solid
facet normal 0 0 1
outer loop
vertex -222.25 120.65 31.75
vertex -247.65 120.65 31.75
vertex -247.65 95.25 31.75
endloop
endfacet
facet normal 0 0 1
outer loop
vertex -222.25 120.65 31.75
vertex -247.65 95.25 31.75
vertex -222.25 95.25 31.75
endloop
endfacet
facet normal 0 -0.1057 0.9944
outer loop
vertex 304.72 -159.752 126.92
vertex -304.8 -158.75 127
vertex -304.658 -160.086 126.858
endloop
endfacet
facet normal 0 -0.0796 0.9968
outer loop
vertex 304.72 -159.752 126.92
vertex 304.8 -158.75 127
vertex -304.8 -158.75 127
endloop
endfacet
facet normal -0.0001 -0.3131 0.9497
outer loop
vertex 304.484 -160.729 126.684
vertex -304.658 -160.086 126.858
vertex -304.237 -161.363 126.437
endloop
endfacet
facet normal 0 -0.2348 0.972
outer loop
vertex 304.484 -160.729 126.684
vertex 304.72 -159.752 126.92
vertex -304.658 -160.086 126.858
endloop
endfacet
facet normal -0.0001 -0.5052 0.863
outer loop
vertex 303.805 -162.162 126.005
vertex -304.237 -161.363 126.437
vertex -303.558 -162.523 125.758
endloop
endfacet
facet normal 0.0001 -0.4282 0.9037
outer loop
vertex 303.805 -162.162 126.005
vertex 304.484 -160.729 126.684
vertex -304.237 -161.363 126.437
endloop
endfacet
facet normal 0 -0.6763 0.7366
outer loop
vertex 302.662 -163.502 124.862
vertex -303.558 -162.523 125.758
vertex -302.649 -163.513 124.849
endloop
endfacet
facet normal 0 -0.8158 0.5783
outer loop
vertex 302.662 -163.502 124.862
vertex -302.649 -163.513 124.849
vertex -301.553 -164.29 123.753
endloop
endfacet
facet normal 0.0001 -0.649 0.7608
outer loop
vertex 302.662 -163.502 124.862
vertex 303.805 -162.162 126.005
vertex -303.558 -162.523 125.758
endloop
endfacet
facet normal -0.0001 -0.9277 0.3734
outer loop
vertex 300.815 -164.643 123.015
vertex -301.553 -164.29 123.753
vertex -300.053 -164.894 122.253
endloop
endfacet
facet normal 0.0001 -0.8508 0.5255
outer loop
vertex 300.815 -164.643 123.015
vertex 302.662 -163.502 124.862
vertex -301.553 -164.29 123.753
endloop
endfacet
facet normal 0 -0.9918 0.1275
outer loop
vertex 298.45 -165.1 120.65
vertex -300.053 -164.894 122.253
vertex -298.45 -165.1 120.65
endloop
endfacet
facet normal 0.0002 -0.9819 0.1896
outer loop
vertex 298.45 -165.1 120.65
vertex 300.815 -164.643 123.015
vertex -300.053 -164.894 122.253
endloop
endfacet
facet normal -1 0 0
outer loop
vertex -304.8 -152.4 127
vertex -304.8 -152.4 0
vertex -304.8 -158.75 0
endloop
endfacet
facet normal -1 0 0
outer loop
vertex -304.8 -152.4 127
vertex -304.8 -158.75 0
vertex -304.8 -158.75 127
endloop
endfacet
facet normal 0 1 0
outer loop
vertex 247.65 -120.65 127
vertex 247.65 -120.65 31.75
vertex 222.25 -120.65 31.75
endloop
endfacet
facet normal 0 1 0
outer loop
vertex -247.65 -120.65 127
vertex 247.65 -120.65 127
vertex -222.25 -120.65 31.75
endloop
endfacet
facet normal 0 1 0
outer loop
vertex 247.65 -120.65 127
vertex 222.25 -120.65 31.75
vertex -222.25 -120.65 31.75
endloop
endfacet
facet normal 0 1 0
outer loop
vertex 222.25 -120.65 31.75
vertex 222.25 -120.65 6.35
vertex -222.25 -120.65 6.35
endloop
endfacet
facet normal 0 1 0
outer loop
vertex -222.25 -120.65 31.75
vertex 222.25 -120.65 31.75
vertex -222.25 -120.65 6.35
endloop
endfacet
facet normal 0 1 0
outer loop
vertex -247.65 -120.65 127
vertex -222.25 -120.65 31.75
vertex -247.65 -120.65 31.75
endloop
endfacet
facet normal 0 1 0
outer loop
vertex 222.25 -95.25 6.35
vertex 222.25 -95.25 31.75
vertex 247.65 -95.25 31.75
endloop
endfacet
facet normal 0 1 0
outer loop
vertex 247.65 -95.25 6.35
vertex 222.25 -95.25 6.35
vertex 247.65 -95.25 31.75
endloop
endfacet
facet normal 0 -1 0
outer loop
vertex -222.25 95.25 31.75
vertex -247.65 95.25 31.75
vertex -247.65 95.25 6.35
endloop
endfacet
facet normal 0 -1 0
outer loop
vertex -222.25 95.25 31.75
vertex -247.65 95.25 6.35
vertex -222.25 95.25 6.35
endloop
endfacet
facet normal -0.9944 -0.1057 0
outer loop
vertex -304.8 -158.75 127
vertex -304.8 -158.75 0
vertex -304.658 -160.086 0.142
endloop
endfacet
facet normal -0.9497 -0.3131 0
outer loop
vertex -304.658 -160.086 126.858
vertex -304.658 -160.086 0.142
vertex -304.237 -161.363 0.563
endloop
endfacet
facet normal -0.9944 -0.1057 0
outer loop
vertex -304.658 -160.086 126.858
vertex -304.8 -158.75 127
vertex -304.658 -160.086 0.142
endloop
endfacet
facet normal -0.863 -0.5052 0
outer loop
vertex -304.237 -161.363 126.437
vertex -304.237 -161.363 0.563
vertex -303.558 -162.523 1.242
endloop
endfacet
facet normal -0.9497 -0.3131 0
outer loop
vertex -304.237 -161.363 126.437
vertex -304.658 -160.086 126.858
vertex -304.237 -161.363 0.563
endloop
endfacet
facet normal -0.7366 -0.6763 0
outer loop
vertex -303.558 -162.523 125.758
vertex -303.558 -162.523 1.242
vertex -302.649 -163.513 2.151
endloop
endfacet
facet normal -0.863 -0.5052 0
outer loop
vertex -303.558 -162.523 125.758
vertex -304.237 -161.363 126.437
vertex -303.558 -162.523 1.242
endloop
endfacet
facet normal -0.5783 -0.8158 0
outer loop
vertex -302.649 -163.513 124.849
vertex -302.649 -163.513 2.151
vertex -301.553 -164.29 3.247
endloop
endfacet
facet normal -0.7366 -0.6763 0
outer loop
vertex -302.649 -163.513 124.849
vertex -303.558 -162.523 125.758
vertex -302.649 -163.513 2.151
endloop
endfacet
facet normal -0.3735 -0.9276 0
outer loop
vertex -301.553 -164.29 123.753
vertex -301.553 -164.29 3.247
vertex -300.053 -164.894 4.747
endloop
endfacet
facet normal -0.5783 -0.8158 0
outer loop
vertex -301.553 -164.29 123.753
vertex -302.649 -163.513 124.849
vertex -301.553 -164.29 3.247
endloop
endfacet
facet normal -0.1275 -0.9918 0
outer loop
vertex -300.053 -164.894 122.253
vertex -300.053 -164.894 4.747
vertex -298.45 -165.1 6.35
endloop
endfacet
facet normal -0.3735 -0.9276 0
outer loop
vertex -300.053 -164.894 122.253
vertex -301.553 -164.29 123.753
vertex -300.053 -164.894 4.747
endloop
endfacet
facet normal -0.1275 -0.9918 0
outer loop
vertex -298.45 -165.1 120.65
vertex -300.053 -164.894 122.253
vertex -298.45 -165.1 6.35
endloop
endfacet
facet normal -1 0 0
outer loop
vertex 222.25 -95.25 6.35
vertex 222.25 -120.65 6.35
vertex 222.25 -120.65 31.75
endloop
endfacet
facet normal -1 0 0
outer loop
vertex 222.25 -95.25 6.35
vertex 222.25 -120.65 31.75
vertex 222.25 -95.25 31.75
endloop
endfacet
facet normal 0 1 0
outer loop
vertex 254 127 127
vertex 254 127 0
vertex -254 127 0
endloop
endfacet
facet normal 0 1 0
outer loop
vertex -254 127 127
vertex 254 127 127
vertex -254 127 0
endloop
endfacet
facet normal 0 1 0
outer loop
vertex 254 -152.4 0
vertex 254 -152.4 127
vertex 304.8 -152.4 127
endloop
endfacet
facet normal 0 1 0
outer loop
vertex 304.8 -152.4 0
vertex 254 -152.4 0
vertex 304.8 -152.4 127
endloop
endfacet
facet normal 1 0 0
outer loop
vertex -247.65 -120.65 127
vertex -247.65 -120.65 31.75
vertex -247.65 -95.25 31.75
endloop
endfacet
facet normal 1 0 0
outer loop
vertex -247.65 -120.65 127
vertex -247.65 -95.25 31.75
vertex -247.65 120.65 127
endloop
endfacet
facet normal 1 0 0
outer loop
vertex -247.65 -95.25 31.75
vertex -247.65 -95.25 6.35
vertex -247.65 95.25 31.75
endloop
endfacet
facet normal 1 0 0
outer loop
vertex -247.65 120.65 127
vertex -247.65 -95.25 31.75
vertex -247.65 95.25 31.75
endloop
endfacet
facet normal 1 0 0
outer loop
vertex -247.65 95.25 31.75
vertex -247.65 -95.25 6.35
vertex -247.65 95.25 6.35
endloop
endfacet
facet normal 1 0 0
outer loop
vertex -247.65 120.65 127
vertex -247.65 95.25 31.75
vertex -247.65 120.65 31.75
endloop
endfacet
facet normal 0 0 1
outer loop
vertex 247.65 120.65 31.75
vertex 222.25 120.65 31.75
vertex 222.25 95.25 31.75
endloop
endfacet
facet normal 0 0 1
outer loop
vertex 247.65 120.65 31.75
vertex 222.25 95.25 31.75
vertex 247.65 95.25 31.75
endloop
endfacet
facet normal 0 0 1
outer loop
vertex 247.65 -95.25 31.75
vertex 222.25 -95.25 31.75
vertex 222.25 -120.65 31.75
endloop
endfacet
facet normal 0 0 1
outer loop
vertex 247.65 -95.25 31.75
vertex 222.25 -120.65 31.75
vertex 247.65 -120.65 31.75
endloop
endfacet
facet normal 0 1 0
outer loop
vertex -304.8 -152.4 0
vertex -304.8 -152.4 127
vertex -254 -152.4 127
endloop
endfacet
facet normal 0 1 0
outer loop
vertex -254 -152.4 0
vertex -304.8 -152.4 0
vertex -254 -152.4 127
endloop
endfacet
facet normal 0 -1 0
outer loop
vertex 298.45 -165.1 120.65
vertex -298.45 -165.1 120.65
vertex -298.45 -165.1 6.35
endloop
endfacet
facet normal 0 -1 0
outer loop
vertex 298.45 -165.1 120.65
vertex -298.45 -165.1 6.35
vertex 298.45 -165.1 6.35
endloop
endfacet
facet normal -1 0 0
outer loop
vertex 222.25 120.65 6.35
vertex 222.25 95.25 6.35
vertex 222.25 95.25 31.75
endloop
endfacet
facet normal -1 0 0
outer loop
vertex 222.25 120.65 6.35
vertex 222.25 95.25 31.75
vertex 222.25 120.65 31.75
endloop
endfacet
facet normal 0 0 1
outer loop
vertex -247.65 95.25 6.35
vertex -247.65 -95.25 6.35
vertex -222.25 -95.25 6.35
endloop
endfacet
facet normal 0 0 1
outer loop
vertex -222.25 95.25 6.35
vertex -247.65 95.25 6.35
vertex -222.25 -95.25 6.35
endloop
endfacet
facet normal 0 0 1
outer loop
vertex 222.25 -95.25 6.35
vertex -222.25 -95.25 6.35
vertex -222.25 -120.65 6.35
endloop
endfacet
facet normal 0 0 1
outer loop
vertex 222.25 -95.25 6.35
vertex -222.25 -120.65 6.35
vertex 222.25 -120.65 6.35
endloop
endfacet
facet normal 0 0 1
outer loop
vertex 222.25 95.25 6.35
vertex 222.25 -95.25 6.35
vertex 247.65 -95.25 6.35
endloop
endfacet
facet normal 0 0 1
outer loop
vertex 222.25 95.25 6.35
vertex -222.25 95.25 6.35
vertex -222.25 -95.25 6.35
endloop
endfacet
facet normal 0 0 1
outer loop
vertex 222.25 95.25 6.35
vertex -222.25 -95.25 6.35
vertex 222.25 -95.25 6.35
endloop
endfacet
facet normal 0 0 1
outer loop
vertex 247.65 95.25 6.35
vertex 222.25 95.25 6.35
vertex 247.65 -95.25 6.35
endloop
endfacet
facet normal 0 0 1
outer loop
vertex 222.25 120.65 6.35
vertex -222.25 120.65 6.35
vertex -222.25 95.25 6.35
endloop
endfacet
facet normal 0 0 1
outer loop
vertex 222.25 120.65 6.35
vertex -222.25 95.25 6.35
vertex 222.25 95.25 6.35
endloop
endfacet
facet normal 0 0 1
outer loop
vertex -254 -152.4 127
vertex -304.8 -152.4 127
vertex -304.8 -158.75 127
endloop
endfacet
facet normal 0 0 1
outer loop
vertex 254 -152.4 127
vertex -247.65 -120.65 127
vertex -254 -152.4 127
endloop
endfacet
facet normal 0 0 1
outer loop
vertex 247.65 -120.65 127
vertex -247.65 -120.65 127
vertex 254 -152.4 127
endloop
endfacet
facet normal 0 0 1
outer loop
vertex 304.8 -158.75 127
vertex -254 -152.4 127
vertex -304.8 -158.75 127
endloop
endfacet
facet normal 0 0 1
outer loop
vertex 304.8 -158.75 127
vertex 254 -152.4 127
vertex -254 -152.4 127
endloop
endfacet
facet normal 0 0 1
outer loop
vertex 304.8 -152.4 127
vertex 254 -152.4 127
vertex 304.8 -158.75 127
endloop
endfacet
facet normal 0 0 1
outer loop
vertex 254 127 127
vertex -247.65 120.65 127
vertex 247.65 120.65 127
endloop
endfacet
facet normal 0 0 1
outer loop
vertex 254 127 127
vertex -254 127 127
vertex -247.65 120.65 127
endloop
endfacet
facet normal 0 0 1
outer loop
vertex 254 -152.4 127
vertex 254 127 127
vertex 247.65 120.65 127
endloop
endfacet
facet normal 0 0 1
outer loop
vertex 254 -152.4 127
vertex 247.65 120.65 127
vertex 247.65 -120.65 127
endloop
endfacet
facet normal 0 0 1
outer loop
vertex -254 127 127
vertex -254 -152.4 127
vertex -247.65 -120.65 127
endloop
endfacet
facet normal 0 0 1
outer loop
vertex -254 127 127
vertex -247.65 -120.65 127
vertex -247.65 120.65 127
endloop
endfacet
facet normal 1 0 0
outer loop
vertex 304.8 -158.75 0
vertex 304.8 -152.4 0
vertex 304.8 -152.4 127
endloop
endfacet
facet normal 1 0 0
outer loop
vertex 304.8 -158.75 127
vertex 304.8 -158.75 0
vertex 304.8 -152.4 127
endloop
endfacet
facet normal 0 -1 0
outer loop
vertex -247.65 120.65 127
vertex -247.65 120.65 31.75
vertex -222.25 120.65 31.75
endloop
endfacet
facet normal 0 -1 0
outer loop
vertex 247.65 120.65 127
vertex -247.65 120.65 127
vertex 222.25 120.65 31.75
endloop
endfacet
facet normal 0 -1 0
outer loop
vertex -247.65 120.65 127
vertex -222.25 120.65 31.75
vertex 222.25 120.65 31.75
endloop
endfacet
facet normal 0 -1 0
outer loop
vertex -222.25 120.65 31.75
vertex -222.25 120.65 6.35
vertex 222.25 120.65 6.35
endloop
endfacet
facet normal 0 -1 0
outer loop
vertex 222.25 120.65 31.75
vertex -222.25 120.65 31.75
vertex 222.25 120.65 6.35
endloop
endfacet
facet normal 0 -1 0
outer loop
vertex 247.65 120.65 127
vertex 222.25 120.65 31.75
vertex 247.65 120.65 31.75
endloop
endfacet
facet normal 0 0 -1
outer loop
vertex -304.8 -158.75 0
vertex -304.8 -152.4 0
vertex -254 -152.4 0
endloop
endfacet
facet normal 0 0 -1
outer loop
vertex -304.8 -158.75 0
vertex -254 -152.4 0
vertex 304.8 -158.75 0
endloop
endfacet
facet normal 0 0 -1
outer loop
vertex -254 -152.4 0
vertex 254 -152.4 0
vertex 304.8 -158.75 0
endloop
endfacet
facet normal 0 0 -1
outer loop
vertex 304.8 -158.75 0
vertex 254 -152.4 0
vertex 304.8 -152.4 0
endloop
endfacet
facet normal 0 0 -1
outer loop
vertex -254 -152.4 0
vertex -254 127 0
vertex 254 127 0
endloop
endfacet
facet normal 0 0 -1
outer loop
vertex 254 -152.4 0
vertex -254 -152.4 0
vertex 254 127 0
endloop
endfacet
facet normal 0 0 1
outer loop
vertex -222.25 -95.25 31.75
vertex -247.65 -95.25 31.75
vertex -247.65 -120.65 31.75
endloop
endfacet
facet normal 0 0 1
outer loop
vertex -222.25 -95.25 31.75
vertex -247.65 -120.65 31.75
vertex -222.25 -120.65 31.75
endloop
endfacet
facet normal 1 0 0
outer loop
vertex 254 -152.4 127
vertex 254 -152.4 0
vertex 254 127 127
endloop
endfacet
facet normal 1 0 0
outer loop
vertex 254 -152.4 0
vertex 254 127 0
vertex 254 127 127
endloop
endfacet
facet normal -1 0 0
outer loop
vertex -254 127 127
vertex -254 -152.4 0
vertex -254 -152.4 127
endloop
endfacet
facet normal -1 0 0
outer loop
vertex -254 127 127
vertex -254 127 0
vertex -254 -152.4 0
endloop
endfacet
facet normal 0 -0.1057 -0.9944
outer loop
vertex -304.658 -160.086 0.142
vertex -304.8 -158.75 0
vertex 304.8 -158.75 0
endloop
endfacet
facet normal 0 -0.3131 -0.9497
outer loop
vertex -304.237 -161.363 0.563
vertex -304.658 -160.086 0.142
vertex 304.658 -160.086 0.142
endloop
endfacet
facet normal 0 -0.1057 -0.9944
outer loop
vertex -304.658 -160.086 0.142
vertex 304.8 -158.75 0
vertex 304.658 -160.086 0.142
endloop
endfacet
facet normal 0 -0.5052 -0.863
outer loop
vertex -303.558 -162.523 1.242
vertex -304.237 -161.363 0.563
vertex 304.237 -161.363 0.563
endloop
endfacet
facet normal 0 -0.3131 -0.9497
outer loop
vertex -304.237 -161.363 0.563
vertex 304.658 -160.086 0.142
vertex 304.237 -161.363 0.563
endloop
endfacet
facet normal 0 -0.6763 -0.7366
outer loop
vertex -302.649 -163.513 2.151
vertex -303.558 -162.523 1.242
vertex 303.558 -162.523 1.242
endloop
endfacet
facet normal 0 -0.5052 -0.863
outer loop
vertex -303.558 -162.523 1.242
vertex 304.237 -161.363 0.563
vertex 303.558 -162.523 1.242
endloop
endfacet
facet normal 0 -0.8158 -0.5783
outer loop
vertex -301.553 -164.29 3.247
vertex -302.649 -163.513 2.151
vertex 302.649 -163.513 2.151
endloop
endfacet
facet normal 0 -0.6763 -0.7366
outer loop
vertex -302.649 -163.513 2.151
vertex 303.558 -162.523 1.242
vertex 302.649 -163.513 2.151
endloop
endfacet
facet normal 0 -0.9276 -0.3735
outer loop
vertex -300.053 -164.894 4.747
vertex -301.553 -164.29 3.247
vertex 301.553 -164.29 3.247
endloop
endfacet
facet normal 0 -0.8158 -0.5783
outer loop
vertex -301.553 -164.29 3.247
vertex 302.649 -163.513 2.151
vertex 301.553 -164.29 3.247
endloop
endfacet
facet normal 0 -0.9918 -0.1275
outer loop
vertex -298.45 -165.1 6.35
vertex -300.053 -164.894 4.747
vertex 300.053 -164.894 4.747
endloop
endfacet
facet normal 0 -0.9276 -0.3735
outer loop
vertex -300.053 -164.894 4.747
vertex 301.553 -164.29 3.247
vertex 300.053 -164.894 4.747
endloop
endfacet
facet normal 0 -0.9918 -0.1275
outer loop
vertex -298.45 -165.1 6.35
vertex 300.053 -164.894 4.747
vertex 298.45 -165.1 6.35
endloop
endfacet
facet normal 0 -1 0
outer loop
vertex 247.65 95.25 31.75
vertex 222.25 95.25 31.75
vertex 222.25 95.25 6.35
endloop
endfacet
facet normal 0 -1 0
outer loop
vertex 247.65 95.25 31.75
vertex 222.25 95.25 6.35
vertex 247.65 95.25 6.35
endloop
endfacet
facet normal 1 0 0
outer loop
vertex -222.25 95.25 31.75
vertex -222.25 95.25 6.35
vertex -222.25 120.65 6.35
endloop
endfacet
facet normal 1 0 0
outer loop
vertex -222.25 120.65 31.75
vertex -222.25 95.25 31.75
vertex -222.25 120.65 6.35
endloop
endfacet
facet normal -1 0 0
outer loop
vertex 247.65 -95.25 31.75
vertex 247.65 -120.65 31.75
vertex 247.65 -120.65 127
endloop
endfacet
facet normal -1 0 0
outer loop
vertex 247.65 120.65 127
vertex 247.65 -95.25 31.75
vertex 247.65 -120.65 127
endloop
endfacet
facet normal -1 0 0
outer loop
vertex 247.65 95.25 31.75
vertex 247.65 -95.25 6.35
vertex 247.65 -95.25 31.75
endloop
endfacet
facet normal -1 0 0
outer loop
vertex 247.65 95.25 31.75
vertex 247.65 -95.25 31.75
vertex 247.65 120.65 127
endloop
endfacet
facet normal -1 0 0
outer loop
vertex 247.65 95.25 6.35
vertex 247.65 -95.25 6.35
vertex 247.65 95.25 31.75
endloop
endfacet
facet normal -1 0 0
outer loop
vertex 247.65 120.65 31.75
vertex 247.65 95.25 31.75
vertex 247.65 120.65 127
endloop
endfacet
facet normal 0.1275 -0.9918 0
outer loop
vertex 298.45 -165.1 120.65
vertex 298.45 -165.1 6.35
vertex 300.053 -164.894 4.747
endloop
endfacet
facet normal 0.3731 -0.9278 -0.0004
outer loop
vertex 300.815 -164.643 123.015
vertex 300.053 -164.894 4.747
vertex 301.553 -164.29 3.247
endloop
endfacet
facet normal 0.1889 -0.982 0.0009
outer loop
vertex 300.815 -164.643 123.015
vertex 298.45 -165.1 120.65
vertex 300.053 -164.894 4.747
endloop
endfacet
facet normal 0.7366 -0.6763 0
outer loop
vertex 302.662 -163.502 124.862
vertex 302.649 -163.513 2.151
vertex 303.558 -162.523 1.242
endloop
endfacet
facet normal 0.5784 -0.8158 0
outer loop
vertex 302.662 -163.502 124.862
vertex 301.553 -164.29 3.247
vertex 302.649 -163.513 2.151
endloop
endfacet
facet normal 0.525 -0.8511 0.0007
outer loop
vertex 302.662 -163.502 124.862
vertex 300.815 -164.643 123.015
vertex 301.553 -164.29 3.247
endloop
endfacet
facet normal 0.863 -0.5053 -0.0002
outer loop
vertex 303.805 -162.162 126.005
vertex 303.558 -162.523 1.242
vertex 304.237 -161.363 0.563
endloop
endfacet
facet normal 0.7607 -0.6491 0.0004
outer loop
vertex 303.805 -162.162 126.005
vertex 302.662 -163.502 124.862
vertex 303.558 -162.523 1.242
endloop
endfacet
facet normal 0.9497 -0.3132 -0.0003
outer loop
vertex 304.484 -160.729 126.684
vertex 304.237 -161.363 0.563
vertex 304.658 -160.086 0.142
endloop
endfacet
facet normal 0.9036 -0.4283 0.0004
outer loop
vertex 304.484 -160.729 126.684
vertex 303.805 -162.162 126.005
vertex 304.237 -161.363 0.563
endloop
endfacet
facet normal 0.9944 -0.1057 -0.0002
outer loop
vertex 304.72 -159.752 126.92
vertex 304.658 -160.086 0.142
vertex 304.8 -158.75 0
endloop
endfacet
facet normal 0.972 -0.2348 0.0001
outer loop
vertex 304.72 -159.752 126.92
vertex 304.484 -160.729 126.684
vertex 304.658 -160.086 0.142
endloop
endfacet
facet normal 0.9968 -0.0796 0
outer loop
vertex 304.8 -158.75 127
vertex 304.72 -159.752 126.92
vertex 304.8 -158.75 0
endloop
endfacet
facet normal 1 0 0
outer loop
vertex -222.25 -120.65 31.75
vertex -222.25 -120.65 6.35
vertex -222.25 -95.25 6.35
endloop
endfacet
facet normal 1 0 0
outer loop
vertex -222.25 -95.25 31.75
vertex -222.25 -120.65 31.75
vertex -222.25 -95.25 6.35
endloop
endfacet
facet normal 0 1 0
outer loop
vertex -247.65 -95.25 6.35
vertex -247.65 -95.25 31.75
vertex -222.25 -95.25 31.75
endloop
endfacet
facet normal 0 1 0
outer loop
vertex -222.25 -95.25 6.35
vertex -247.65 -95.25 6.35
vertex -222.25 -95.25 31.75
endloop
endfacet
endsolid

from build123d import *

# Parameters (mm, degrees)
F0_W     = 6.35
F0_H     = 6.35
F0_W_2   = 495.3
F0_H_2   = 241.3
F1_DEPTH = 127
F2_DEPTH = 6.35
F3_W     = 25.4
F3_H     = 25.4
F4_DEPTH = 25.4
F5_W     = 508
F5_H     = 127
F6_DEPTH = 25.4
F7_W     = 609.6
F7_H     = 127
F8_DEPTH = 12.7
F9_R     = 6.35


with BuildPart() as f1:
    # F0 (on Top) → F1 (new body)
    with BuildSketch(Plane.XY):
        with Locations((-250.825, 123.825)):
            Rectangle(F0_W, F0_H)
        with Locations((-250.825, -123.825)):
            Rectangle(F0_W, F0_H)
        with Locations((250.825, -123.825)):
            Rectangle(F0_W, F0_H)
        with Locations((250.825, 123.825)):
            Rectangle(F0_W, F0_H)
        with Locations((0, 123.825)):
            Rectangle(F0_W_2, F0_H)
        with Locations((0, -123.825)):
            Rectangle(F0_W_2, F0_H)
        with Locations((250.825, 0)):
            Rectangle(F0_W, F0_H_2)
        with Locations((-250.825, 0)):
            Rectangle(F0_W, F0_H_2)
    extrude(amount=F1_DEPTH)

    # F0 (on Top) → F2 (join)
    with BuildSketch(Plane.XY):
        Rectangle(F0_W_2, F0_H_2)
    extrude(amount=F2_DEPTH)

    # F3 (on face) → F4 (join)
    with BuildSketch(Plane.XY.offset(6.35)):
        with Locations((-234.95, -107.95)):
            Rectangle(F3_W, F3_H)
        with Locations((-234.95, 107.95)):
            Rectangle(F3_W, F3_H)
        with Locations((234.95, 107.95)):
            Rectangle(F3_W, F3_H)
        with Locations((234.95, -107.95)):
            Rectangle(F3_W, F3_H)
    extrude(amount=F4_DEPTH)

    # F5 (on face) → F6 (join)
    with BuildSketch(Plane.XZ.offset(127)):
        with Locations((0, 63.5)):
            Rectangle(F5_W, F5_H)
    extrude(amount=F6_DEPTH)

    # F7 (on face) → F8 (join)
    with BuildSketch(Plane.XZ.offset(152.4)):
        with Locations((0, 63.5)):
            Rectangle(F7_W, F7_H)
    extrude(amount=F8_DEPTH)

    # F9
    f9_edges = [f1.edges().sort_by_distance(p)[0] for p in [
        (-304.8, -165.1, 63.5),
        (0, -165.1, 0),
        (304.8, -165.1, 63.5),
        (0, -165.1, 127),
    ]]
    fillet(f9_edges, radius=F9_R)


solid = f1.part
